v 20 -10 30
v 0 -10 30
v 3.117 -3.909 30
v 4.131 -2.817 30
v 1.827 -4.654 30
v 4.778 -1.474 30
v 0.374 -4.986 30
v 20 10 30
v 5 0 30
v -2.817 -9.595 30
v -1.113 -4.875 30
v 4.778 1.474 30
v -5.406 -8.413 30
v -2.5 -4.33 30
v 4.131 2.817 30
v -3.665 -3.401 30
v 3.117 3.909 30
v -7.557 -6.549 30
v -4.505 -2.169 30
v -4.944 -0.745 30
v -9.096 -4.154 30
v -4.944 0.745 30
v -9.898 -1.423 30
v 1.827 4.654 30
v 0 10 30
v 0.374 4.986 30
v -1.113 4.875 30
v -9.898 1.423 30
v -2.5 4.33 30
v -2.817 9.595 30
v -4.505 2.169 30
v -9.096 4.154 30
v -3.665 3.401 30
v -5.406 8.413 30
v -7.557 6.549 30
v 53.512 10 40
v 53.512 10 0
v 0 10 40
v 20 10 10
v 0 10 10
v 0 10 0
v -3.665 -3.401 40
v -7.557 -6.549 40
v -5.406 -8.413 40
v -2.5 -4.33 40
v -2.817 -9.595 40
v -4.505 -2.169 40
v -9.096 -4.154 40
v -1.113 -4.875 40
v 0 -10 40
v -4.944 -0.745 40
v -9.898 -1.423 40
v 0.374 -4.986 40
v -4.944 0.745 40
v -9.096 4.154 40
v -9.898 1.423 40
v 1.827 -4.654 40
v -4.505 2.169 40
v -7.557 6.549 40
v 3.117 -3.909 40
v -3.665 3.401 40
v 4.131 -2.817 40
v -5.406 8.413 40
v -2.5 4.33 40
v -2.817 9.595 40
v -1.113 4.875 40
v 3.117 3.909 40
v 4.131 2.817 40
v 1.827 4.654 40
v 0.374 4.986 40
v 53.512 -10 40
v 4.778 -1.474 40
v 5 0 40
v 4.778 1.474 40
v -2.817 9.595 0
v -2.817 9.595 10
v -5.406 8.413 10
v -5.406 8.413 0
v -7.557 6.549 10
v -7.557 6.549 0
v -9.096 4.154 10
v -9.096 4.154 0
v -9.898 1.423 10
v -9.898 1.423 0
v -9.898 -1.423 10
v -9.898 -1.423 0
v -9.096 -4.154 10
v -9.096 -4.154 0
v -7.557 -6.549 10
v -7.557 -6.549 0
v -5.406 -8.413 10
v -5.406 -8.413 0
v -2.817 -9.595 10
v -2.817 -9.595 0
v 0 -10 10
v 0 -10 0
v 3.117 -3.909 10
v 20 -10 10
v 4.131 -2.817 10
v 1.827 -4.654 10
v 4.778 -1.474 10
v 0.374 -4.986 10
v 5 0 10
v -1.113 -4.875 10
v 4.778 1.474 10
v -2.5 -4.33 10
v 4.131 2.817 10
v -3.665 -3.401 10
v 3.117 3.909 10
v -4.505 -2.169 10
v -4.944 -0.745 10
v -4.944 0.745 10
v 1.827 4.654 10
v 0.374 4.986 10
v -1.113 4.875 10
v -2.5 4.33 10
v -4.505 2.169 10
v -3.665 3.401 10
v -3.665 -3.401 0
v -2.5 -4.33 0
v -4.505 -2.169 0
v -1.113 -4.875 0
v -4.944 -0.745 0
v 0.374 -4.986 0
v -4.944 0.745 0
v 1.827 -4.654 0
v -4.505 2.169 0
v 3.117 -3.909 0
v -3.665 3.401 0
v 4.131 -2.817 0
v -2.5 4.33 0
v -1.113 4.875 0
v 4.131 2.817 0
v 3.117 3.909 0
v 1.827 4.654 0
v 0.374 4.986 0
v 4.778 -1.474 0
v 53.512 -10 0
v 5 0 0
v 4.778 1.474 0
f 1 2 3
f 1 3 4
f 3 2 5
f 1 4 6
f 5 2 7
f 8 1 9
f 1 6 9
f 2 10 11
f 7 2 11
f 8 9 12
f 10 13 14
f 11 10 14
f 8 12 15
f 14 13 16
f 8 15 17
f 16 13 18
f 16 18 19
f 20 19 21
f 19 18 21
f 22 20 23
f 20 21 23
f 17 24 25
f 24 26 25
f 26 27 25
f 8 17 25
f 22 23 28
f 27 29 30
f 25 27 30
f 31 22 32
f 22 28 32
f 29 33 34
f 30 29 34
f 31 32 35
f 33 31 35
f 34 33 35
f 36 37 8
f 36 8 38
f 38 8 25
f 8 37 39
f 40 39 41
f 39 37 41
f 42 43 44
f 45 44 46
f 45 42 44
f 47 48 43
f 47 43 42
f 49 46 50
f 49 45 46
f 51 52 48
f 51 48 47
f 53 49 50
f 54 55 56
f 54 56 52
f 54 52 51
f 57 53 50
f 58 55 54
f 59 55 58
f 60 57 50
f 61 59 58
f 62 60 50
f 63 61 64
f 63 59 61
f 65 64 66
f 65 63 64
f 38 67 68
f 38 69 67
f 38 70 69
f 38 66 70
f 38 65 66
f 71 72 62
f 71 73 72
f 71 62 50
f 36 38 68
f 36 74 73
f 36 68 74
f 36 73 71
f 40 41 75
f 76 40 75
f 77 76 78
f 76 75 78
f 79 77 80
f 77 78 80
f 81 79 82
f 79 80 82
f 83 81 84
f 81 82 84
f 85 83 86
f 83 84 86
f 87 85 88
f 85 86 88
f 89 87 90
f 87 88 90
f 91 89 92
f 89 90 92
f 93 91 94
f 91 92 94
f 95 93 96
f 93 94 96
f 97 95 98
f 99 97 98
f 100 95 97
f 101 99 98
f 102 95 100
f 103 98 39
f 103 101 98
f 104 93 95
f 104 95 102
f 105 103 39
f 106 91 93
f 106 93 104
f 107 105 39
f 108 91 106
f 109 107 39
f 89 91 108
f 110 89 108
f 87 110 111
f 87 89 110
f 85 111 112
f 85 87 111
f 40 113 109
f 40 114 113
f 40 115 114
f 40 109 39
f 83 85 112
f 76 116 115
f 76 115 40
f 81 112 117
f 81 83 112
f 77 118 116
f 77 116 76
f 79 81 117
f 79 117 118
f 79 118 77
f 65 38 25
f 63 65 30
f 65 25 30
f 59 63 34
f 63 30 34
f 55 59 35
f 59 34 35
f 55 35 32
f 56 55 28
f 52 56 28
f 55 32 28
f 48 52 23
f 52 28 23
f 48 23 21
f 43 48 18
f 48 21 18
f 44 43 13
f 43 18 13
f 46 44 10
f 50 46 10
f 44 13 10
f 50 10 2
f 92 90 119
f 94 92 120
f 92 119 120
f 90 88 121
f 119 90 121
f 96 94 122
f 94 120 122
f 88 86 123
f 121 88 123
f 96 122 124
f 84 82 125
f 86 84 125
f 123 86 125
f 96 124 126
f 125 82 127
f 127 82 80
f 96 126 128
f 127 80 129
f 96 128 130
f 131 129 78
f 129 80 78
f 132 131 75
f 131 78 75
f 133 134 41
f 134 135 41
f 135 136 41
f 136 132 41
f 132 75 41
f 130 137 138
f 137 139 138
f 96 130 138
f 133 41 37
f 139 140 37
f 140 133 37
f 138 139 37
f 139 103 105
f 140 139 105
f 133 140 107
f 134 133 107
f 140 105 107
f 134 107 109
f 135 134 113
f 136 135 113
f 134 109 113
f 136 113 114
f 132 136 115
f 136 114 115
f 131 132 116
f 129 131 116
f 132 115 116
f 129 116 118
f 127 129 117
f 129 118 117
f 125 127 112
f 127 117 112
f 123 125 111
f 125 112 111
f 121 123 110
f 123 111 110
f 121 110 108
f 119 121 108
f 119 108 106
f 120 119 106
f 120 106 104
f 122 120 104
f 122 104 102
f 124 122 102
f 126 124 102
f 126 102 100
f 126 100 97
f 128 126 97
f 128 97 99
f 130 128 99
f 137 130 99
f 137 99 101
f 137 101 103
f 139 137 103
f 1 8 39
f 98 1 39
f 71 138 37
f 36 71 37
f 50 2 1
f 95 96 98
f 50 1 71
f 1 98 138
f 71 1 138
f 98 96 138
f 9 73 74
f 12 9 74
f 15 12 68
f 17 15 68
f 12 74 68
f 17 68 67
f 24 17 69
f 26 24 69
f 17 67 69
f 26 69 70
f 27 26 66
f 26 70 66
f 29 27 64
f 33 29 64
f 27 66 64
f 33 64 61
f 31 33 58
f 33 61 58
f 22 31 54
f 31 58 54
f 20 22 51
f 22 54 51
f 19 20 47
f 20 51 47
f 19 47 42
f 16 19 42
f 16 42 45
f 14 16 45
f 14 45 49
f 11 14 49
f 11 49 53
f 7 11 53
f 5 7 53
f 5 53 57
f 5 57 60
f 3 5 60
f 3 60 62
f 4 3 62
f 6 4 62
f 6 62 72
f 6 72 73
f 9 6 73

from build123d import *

# Parameters (mm, degrees)
SKETCH1_R               = 10
BOSS_EXTRUDE1_DEPTH     = 40
CUT_EXTRUDE1_DEPTH      = 20
CUT_EXTRUDE1_DEPTH_BACK = 40
SKETCH2_W               = 20
SKETCH2_H               = 28.944782362
SKETCH3_R               = 5
CUT_EXTRUDE3_DEPTH      = 40


with BuildPart() as part:
    # Sketch1 → Boss-Extrude1 (new body)
    with BuildSketch(Plane.XY):
        Circle(SKETCH1_R)
        with BuildLine():
            Line((53.512258846, 10), (0, 10))
            ThreePointArc((0, 10), (7.071067812, 7.071067812), (10, 0))
            ThreePointArc((10, 0), (7.071067812, -7.071067812), (0, -10))
            Line((0, -10), (53.512258846, -10))
            Line((53.512258846, -10), (53.512258846, 10))
        make_face()
    extrude(amount=BOSS_EXTRUDE1_DEPTH)

    # Sketch2 → Cut-Extrude1 (cut, two sides: drawn at the far end of the back side and taken through both)
    with BuildSketch(Plane(origin=(0, 0, 0), x_dir=(0, 0, -1), z_dir=(1, 0, 0)).offset(-CUT_EXTRUDE1_DEPTH_BACK)):
        with Locations((-20, 0)):
            Rectangle(SKETCH2_W, SKETCH2_H)
    extrude(amount=CUT_EXTRUDE1_DEPTH + CUT_EXTRUDE1_DEPTH_BACK, mode=Mode.SUBTRACT)

    # Sketch3 → Cut-Extrude3 (cut)
    with BuildSketch(Plane.XY.offset(40)):
        Circle(SKETCH3_R)
    extrude(amount=-CUT_EXTRUDE3_DEPTH, mode=Mode.SUBTRACT)


solid = part.part
